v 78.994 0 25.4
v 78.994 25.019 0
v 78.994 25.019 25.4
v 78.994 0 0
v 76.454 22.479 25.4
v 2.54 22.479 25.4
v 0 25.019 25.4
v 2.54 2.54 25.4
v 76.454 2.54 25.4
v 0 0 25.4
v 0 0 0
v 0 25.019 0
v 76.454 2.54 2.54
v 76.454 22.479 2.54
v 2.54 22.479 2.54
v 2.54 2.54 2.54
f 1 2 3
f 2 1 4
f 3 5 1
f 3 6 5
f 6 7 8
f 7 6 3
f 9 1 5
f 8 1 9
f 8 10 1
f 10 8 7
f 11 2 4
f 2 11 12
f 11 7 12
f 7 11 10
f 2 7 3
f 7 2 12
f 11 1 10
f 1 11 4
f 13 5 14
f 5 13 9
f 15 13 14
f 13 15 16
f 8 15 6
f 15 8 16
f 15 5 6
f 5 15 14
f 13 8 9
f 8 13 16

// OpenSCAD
// All units are in Milimeter
$fn = 256;

//Q-tip container
qtLt = 73.025; // 2.875"
qtWt = 19.05; // .75"
qtHt = 25.4; // Box 2.875", Container Depth 1.0" 
qtfit = .889; // .035"
qtThickness = 2.54; // .100"

// Q-Tip container 
difference(){
  cube([
    (qtLt+qtfit+(qtThickness*2)),
    (qtWt+qtfit+(qtThickness*2)),
    qtHt
    ],
    center=false
    );
  translate([qtThickness,qtThickness,qtThickness]){
    cube([
      qtLt+qtfit,
      qtWt+qtfit,
      qtHt
      ],
      center=false
      );
  };
  

};
